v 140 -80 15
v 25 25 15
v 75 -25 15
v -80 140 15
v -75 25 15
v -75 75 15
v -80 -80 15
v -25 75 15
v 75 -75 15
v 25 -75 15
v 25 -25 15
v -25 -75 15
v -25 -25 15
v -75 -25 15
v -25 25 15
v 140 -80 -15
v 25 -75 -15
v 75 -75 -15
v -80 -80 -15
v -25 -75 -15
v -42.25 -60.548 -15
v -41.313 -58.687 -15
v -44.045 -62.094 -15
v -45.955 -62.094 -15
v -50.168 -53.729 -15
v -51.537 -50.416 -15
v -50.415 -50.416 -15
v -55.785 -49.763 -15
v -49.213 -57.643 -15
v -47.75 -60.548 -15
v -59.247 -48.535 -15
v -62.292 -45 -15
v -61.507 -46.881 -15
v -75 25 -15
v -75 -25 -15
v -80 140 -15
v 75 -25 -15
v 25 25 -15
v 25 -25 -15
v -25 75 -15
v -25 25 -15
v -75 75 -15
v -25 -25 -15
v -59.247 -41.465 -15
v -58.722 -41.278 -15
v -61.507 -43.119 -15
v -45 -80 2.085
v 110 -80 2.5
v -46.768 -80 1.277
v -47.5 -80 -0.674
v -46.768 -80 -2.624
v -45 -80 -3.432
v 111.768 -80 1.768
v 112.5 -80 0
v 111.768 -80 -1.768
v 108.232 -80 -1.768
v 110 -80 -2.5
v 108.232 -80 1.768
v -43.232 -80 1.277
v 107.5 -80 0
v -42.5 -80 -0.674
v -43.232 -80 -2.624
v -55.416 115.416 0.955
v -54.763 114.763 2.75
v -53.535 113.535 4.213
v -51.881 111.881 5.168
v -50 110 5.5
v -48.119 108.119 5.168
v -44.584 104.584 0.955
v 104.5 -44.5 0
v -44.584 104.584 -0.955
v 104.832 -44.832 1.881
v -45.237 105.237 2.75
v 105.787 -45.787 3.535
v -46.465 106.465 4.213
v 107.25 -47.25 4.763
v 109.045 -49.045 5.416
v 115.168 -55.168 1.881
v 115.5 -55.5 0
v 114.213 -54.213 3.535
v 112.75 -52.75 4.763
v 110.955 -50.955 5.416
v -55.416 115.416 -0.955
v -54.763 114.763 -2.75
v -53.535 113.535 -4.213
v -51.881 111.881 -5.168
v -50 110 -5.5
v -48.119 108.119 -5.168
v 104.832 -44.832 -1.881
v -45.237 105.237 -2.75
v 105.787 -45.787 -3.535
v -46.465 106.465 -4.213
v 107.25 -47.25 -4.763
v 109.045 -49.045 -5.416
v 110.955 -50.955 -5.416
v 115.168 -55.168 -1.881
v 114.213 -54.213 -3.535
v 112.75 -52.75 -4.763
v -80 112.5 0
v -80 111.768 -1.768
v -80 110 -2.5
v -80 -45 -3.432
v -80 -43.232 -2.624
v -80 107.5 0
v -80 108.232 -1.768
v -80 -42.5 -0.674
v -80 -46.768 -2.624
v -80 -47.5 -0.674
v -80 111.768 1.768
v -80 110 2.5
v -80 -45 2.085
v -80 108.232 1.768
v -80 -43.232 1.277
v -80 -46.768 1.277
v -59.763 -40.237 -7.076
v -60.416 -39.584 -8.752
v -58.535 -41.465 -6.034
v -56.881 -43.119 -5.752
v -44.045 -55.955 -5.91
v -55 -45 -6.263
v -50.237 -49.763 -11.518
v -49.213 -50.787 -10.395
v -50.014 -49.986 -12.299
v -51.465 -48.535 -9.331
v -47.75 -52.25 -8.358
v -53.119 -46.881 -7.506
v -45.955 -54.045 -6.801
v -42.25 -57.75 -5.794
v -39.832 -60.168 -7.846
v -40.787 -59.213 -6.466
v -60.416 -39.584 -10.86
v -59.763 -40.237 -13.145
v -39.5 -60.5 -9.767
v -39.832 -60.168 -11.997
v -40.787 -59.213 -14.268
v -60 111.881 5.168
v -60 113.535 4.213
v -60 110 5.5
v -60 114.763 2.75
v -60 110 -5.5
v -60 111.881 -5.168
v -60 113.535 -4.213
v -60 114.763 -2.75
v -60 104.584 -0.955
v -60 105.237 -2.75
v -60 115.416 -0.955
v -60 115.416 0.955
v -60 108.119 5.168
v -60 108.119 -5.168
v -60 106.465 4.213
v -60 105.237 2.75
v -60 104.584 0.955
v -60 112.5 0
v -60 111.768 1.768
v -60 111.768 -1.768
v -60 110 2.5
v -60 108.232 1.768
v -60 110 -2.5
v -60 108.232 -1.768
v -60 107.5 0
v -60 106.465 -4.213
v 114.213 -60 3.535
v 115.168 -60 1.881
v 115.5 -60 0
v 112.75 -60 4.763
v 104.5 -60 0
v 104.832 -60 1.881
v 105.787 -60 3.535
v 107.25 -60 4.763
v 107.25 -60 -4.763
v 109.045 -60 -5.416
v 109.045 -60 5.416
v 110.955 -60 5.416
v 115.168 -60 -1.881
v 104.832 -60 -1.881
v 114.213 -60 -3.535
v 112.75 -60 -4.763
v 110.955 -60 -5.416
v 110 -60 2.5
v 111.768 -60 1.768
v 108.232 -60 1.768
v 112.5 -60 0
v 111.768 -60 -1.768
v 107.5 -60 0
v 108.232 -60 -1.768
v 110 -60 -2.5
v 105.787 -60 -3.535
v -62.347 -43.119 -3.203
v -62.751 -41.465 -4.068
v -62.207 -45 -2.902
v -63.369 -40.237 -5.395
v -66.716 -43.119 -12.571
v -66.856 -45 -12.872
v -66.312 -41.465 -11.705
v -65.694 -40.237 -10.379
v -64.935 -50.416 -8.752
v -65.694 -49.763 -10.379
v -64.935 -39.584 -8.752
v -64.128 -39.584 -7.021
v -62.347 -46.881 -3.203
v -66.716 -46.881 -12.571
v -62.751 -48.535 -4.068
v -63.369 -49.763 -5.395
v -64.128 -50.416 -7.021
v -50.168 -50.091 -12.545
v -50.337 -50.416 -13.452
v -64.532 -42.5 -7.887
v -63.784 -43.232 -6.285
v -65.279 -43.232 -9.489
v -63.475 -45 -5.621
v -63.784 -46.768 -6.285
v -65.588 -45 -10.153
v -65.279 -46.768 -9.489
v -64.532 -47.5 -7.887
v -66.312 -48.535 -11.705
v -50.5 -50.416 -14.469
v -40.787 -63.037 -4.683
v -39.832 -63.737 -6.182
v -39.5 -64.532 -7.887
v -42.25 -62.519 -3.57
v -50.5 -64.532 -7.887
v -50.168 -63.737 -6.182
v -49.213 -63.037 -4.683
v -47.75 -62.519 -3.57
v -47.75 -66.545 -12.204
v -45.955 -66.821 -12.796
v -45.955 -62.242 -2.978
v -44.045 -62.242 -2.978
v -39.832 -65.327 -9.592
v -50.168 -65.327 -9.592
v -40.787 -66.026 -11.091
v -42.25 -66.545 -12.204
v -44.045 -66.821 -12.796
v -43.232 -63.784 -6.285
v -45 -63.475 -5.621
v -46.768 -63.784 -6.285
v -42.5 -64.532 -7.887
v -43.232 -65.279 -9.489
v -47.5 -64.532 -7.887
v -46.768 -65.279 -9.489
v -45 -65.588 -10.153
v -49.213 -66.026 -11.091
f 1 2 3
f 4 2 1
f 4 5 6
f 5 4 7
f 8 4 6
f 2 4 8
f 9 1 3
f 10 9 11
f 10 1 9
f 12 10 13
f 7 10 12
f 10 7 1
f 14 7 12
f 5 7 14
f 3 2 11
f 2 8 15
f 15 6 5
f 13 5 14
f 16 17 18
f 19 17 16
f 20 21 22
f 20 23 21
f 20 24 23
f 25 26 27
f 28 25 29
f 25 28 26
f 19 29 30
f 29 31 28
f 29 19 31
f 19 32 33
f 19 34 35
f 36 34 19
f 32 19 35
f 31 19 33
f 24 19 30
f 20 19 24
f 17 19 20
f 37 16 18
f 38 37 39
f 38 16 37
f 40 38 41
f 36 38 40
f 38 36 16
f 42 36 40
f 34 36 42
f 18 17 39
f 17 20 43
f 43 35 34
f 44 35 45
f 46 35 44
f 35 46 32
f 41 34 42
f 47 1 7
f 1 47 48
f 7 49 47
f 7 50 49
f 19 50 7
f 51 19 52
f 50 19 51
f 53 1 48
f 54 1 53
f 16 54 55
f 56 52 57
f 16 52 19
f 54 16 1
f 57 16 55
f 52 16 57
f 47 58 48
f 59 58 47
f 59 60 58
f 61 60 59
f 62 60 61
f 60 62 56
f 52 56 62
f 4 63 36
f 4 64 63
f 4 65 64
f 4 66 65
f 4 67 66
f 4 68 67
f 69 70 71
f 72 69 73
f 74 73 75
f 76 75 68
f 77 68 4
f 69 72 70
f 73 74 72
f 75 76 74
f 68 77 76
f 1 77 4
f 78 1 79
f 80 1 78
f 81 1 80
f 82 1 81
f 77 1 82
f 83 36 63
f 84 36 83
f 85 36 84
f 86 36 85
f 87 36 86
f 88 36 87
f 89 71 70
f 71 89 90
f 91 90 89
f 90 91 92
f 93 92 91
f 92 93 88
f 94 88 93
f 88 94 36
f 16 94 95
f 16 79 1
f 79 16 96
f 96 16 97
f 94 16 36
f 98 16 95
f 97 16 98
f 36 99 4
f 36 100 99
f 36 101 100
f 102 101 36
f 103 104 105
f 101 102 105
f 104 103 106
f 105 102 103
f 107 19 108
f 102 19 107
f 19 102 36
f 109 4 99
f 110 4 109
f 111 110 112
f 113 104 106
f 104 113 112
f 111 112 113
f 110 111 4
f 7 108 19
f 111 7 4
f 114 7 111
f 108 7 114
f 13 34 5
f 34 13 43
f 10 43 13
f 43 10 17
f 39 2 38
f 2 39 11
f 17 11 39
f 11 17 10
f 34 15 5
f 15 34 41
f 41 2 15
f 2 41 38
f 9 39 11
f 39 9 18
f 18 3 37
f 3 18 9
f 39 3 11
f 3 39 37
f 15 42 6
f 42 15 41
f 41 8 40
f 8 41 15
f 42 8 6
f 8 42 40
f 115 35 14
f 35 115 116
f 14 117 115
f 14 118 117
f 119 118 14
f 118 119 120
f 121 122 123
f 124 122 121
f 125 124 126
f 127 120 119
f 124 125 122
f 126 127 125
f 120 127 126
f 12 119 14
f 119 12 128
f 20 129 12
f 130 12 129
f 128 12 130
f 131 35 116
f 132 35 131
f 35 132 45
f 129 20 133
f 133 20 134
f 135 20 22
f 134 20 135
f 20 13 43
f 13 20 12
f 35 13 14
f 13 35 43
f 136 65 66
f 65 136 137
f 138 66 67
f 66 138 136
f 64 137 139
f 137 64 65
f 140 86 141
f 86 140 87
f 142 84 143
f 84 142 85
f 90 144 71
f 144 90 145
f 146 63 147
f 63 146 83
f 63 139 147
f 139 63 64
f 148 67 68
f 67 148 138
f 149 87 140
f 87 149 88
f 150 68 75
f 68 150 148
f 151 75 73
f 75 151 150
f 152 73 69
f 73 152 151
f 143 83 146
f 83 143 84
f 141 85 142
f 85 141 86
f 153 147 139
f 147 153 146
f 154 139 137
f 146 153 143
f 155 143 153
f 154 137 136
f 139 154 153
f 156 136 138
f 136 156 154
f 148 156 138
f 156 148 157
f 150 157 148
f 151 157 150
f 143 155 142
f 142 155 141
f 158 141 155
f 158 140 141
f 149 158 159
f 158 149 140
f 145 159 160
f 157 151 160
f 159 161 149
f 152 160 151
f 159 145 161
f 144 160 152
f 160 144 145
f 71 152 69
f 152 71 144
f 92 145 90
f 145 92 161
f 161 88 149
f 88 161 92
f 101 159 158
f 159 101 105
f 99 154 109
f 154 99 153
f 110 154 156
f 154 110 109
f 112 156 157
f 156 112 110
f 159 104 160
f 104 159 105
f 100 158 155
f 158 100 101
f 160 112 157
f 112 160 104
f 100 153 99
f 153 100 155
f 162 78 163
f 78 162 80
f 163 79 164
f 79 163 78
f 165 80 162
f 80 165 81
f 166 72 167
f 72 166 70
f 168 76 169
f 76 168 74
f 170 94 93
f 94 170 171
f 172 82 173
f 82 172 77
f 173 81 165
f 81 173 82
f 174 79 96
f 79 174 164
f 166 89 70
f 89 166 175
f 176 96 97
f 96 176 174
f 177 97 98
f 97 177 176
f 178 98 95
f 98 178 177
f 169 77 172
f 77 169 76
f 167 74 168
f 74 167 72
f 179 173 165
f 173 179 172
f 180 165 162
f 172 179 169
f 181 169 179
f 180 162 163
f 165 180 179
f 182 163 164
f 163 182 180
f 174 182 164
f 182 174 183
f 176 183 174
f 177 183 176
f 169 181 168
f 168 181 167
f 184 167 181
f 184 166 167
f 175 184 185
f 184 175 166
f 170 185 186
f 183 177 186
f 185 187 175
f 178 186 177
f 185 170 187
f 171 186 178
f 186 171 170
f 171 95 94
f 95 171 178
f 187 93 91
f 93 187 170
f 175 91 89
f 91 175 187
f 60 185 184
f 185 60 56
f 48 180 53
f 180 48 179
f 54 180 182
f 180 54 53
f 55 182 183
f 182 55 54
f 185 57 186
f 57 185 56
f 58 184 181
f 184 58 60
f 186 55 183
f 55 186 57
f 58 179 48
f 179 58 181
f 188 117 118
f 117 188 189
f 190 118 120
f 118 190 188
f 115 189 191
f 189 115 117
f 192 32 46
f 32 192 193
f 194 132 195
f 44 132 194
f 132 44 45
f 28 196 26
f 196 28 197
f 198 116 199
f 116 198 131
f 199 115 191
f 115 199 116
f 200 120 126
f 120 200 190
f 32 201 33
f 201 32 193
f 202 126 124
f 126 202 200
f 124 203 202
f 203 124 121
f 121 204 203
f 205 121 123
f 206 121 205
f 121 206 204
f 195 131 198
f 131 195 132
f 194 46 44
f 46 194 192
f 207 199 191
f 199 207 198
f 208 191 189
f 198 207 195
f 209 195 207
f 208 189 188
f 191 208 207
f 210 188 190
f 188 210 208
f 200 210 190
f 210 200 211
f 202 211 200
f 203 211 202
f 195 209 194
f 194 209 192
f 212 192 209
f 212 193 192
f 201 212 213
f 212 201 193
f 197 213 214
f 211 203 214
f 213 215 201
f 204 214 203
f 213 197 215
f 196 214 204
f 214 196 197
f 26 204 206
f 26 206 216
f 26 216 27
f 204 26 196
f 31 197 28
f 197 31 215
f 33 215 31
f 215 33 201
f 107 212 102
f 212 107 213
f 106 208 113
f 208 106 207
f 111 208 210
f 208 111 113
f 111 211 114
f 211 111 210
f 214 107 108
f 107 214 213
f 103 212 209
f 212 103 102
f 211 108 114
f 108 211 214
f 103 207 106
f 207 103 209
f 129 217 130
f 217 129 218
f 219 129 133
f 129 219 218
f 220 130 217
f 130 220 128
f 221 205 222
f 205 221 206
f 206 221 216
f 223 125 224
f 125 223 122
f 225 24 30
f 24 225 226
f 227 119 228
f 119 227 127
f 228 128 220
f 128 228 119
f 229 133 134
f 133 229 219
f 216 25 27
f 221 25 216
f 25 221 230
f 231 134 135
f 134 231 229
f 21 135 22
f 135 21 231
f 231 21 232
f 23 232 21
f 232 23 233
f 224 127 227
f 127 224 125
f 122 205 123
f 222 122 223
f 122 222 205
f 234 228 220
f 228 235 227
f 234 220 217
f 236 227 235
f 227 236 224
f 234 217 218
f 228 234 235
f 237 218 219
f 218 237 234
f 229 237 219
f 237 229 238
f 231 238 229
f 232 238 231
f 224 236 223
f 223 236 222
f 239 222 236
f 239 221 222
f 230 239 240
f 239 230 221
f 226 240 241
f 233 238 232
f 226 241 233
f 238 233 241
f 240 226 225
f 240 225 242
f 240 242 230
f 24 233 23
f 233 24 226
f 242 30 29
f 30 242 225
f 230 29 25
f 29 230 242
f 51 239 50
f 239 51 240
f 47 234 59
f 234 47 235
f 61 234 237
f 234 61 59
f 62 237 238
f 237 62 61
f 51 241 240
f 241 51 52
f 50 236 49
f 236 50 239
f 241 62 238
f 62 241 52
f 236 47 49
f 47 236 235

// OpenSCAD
/*
  Shelf bracket based on Sierpinkski's triangle.

  This bracket is designed for use with 1.5" screws and a drill.
  In particular, the mounting holes are countersunk such that 1.5"
  screws will not stick through a ~0.5 in shelf when tightened.
  Also, the holes near the apex are diagonally countersunk so as
  to be accessible from the side. This means that you need to install
  pairs of brackets in opposite 'handed-ness' for maximum lateral
  stability.

*/

sidelength = 200;
thickness = 30;

screwlength = 38.1; // 1.5 inches in mm
screwhead = 5.5;
screwshaft = 2.5;   // penis.

module triangle(size=sidelength, height=1) {
  // extrudes a right triangle of given size and thickness
  linear_extrude(height=height, center=true)
  polygon(points = [[0,0], [-size,0], [0,-size]], paths = [[0,1,2]]);
}

module countersink() {
  // The thinner cylinder can be used to show how far your
  // screw will penetrate.
  union() {
    translate([0, 0, -screwlength])
      cylinder(r=screwhead, h=screwlength);
    #cylinder(r=screwshaft, h=screwlength);
  }
}

S = sidelength/2; // precompute this oft-used value
P = 10;            // padding for outer edges
translate([S/4,S/4,0]) difference() {
  union() {
    difference() {
      translate([-(S+P/2), -(S+P/2), 0])
        scale(-1)
        triangle(sidelength + P*2, 30);
      triangle(S, 50);
      translate([S/2, -S/2,0])triangle(size=S/2,height=50);
      translate([-S/2,S/2,0])triangle(size=S/2,height=50);
      translate([-S/2,-S/2,0])triangle(size=S/2,height=50);
    }
  }
  rotate(-90,[0,1,0])
    translate([0,S-15,S-15])
    countersink();

  rotate(90,[1,0,0])
    translate([S-15,0,S-15])
    countersink();

  translate([-S+15,-S+30,-10])
    rotate(-65,[0,1,0])
    translate([0,0,5])
    countersink();

  translate([-S+30,-S+15,-10])
    rotate(65,[1,0,0])
    translate([0,0,5])
    countersink();
}
